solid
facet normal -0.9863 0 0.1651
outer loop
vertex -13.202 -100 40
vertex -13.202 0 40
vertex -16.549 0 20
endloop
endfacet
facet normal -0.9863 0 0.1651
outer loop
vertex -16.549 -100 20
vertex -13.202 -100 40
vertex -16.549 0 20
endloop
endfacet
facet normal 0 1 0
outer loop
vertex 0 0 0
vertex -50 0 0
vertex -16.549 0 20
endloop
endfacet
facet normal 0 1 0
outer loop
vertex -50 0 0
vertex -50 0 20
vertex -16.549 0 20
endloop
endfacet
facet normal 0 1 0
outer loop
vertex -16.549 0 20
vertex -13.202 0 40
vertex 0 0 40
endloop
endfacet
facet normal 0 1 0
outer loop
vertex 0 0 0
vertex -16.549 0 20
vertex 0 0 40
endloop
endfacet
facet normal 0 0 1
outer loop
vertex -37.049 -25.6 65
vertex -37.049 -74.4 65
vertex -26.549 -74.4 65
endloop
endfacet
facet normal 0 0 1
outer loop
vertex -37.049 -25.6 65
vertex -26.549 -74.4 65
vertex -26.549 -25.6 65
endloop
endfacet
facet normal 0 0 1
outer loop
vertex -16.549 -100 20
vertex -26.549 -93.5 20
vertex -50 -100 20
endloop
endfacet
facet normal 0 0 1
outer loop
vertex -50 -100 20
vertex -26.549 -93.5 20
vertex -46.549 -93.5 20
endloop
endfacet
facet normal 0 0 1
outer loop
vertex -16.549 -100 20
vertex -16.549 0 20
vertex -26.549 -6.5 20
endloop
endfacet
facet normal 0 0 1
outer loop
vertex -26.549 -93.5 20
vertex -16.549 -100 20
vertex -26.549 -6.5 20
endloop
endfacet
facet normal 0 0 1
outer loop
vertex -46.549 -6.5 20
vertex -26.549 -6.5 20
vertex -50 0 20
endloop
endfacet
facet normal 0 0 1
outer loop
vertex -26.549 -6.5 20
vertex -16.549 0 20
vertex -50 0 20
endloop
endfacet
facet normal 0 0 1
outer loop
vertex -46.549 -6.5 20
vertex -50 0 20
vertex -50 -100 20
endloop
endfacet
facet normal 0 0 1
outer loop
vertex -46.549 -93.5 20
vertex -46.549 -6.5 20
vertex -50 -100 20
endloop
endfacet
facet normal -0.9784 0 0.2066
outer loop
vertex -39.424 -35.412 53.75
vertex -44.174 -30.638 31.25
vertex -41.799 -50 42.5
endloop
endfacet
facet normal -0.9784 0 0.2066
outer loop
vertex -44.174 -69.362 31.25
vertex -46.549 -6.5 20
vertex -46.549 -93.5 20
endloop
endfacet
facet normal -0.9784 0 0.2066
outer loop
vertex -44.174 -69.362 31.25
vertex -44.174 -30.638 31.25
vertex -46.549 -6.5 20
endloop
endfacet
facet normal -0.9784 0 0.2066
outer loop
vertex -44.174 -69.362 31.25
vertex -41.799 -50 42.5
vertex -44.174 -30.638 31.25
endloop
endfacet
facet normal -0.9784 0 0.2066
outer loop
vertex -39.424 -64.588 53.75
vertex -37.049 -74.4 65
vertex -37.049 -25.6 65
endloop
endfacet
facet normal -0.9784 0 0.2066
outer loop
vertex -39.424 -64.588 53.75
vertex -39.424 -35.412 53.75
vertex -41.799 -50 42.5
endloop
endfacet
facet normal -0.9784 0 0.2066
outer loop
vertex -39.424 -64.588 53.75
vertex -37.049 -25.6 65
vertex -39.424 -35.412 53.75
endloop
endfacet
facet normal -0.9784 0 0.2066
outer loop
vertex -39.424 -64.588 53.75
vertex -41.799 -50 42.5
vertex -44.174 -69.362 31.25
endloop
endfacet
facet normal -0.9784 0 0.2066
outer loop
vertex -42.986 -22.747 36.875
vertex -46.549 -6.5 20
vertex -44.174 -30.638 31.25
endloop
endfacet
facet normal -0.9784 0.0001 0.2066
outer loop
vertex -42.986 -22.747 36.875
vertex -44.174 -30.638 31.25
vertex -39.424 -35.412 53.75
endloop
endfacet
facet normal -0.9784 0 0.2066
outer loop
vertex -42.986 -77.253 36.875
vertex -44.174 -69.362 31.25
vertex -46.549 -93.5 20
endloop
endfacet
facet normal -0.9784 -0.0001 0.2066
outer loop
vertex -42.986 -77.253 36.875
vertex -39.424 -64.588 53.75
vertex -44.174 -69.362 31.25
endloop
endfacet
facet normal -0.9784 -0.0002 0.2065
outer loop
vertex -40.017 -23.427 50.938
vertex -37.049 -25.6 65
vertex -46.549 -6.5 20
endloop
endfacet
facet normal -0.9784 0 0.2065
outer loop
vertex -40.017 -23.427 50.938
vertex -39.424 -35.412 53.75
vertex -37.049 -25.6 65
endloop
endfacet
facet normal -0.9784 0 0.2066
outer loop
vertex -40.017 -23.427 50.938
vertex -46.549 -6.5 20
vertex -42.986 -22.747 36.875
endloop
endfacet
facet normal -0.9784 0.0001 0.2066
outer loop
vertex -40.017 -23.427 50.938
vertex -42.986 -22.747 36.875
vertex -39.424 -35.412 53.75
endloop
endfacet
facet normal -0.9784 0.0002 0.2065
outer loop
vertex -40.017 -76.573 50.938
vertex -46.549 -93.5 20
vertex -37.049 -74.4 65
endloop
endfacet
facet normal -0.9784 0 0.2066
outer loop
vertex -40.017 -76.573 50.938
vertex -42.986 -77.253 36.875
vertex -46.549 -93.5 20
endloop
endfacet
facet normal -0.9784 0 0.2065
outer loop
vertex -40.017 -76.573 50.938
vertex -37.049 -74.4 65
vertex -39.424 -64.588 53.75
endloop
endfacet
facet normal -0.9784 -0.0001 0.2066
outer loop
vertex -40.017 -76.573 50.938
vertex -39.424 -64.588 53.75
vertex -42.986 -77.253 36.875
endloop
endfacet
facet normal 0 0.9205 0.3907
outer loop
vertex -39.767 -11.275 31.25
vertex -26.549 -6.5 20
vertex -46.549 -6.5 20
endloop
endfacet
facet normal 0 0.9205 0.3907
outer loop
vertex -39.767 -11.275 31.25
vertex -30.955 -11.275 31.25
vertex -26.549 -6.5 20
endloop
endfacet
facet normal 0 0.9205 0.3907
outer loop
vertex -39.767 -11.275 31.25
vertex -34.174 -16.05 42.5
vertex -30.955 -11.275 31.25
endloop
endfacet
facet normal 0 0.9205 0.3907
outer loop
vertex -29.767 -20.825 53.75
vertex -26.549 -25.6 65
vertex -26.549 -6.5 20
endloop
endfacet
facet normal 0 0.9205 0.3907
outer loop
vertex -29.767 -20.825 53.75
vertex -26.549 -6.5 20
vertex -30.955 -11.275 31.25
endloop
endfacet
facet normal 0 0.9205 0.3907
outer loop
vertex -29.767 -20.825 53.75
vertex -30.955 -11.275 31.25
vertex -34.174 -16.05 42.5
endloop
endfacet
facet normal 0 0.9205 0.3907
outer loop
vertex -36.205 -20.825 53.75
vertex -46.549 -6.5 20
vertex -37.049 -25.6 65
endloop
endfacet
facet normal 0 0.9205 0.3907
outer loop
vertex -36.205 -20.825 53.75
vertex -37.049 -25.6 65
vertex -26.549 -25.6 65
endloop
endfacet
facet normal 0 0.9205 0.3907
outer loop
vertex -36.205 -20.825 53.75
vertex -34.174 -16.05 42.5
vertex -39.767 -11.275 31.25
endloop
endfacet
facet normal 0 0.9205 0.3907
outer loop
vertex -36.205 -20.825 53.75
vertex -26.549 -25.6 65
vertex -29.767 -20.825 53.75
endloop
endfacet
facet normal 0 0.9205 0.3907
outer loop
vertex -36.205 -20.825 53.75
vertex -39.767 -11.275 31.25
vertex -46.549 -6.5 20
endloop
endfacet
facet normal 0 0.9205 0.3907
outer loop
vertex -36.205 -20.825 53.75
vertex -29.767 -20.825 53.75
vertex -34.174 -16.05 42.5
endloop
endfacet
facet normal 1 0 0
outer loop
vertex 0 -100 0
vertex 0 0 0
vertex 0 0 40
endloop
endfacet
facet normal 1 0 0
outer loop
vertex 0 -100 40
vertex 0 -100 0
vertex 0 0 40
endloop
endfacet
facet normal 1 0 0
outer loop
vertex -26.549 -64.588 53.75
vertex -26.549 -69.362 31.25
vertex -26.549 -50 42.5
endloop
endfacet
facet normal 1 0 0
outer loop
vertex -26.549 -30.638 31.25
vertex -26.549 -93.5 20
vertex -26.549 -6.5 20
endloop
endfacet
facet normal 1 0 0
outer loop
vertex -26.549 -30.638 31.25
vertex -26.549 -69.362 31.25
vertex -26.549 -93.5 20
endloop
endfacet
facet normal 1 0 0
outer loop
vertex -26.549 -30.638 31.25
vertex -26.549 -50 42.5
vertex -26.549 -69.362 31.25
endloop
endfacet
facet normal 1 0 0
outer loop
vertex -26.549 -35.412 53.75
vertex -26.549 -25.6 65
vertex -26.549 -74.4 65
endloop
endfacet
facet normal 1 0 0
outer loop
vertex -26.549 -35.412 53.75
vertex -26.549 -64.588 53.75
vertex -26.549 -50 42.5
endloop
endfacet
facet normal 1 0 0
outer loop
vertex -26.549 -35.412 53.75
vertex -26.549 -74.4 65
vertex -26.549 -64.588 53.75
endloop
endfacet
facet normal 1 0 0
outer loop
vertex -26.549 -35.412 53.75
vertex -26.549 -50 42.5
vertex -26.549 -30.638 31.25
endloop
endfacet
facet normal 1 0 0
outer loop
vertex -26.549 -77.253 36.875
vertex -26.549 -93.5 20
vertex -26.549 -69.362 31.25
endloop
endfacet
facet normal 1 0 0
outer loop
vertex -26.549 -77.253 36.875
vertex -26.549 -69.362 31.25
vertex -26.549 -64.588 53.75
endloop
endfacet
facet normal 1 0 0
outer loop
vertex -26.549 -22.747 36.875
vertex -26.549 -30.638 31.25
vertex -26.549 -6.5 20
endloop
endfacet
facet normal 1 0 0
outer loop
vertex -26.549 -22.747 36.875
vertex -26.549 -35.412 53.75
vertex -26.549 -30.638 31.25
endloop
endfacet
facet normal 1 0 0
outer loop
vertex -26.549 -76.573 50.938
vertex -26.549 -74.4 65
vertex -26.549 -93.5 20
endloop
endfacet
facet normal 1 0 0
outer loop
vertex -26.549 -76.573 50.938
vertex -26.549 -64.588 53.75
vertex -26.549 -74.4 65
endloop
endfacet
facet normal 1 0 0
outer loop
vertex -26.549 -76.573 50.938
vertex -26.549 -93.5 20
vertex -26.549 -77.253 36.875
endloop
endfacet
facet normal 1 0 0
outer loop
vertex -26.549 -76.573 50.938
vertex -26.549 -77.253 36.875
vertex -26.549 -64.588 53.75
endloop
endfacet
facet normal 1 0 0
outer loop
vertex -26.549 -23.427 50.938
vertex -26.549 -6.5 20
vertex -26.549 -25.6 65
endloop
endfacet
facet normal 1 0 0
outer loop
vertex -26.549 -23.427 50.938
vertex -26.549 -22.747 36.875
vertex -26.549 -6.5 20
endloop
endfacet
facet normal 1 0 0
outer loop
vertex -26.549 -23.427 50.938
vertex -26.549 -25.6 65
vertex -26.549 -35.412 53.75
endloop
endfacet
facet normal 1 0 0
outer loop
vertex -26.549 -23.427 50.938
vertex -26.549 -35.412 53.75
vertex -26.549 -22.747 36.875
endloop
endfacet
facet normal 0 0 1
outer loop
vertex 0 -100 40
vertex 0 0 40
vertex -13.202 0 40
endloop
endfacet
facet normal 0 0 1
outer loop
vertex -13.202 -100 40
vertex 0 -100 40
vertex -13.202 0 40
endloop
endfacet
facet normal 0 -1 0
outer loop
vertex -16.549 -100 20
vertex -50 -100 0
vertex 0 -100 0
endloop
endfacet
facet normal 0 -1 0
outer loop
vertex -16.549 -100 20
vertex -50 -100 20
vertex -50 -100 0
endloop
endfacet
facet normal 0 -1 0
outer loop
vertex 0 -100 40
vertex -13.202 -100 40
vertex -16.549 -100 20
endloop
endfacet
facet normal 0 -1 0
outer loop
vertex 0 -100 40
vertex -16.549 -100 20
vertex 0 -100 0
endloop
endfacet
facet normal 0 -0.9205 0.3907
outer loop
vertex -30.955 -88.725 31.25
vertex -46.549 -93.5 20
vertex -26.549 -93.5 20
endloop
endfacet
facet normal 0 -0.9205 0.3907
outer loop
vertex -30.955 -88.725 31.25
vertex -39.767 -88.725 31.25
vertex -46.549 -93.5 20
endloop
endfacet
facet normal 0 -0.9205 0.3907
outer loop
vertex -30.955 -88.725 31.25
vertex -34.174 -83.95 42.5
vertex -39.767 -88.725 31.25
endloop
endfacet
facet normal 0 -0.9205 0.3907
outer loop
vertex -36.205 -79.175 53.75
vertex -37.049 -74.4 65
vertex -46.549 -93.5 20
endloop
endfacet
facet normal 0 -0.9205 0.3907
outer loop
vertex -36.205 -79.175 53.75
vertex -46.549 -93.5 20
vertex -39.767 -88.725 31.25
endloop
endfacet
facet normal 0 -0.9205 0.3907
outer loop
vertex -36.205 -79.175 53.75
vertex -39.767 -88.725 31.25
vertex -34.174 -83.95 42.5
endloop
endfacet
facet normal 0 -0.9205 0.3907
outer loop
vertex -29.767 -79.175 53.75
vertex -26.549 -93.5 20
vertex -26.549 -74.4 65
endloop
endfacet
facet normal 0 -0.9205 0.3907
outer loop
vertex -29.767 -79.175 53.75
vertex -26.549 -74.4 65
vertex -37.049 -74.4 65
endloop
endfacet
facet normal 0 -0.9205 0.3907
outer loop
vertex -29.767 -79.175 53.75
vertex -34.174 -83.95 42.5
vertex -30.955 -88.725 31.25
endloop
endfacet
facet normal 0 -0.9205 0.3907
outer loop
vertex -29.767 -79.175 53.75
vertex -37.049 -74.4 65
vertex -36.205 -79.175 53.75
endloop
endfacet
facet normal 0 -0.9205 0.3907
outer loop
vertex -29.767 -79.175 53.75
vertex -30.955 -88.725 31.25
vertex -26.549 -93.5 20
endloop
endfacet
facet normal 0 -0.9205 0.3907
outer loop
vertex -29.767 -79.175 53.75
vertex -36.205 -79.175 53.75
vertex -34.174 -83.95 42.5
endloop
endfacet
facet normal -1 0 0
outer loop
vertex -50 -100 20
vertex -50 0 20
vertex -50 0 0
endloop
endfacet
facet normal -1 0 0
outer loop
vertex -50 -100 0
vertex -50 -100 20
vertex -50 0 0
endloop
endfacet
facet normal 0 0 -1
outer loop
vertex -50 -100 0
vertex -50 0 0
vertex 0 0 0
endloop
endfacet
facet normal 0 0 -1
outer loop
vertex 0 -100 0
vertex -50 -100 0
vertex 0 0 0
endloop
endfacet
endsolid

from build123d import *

# Parameters (mm, degrees)
F1_DEPTH = 100
F2_W     = 20
F2_H     = 87
F4_W     = 10.5
F4_H     = 48.8


with BuildPart() as f1:
    # F0 (on Front) → F1 (new body)
    with BuildSketch(Plane.XZ):
        Polygon((-50, 0), (0, 0), (0, 40), (-13.2016703318, 40), (-16.5485225135, 20), (-50, 20), align=None)
    extrude(amount=F1_DEPTH)

    # F2 (on face) → F5 section 0
    with BuildSketch(Plane.XY.offset(20)):
        with Locations((-36.5485225135, -50)):
            Rectangle(F2_W, F2_H)
    # F4 (on offset) → F5 section 1
    with BuildSketch(Plane.XY.offset(65)):
        with Locations((-31.7985225135, -50)):
            Rectangle(F4_W, F4_H)
    loft()


solid = f1.part
